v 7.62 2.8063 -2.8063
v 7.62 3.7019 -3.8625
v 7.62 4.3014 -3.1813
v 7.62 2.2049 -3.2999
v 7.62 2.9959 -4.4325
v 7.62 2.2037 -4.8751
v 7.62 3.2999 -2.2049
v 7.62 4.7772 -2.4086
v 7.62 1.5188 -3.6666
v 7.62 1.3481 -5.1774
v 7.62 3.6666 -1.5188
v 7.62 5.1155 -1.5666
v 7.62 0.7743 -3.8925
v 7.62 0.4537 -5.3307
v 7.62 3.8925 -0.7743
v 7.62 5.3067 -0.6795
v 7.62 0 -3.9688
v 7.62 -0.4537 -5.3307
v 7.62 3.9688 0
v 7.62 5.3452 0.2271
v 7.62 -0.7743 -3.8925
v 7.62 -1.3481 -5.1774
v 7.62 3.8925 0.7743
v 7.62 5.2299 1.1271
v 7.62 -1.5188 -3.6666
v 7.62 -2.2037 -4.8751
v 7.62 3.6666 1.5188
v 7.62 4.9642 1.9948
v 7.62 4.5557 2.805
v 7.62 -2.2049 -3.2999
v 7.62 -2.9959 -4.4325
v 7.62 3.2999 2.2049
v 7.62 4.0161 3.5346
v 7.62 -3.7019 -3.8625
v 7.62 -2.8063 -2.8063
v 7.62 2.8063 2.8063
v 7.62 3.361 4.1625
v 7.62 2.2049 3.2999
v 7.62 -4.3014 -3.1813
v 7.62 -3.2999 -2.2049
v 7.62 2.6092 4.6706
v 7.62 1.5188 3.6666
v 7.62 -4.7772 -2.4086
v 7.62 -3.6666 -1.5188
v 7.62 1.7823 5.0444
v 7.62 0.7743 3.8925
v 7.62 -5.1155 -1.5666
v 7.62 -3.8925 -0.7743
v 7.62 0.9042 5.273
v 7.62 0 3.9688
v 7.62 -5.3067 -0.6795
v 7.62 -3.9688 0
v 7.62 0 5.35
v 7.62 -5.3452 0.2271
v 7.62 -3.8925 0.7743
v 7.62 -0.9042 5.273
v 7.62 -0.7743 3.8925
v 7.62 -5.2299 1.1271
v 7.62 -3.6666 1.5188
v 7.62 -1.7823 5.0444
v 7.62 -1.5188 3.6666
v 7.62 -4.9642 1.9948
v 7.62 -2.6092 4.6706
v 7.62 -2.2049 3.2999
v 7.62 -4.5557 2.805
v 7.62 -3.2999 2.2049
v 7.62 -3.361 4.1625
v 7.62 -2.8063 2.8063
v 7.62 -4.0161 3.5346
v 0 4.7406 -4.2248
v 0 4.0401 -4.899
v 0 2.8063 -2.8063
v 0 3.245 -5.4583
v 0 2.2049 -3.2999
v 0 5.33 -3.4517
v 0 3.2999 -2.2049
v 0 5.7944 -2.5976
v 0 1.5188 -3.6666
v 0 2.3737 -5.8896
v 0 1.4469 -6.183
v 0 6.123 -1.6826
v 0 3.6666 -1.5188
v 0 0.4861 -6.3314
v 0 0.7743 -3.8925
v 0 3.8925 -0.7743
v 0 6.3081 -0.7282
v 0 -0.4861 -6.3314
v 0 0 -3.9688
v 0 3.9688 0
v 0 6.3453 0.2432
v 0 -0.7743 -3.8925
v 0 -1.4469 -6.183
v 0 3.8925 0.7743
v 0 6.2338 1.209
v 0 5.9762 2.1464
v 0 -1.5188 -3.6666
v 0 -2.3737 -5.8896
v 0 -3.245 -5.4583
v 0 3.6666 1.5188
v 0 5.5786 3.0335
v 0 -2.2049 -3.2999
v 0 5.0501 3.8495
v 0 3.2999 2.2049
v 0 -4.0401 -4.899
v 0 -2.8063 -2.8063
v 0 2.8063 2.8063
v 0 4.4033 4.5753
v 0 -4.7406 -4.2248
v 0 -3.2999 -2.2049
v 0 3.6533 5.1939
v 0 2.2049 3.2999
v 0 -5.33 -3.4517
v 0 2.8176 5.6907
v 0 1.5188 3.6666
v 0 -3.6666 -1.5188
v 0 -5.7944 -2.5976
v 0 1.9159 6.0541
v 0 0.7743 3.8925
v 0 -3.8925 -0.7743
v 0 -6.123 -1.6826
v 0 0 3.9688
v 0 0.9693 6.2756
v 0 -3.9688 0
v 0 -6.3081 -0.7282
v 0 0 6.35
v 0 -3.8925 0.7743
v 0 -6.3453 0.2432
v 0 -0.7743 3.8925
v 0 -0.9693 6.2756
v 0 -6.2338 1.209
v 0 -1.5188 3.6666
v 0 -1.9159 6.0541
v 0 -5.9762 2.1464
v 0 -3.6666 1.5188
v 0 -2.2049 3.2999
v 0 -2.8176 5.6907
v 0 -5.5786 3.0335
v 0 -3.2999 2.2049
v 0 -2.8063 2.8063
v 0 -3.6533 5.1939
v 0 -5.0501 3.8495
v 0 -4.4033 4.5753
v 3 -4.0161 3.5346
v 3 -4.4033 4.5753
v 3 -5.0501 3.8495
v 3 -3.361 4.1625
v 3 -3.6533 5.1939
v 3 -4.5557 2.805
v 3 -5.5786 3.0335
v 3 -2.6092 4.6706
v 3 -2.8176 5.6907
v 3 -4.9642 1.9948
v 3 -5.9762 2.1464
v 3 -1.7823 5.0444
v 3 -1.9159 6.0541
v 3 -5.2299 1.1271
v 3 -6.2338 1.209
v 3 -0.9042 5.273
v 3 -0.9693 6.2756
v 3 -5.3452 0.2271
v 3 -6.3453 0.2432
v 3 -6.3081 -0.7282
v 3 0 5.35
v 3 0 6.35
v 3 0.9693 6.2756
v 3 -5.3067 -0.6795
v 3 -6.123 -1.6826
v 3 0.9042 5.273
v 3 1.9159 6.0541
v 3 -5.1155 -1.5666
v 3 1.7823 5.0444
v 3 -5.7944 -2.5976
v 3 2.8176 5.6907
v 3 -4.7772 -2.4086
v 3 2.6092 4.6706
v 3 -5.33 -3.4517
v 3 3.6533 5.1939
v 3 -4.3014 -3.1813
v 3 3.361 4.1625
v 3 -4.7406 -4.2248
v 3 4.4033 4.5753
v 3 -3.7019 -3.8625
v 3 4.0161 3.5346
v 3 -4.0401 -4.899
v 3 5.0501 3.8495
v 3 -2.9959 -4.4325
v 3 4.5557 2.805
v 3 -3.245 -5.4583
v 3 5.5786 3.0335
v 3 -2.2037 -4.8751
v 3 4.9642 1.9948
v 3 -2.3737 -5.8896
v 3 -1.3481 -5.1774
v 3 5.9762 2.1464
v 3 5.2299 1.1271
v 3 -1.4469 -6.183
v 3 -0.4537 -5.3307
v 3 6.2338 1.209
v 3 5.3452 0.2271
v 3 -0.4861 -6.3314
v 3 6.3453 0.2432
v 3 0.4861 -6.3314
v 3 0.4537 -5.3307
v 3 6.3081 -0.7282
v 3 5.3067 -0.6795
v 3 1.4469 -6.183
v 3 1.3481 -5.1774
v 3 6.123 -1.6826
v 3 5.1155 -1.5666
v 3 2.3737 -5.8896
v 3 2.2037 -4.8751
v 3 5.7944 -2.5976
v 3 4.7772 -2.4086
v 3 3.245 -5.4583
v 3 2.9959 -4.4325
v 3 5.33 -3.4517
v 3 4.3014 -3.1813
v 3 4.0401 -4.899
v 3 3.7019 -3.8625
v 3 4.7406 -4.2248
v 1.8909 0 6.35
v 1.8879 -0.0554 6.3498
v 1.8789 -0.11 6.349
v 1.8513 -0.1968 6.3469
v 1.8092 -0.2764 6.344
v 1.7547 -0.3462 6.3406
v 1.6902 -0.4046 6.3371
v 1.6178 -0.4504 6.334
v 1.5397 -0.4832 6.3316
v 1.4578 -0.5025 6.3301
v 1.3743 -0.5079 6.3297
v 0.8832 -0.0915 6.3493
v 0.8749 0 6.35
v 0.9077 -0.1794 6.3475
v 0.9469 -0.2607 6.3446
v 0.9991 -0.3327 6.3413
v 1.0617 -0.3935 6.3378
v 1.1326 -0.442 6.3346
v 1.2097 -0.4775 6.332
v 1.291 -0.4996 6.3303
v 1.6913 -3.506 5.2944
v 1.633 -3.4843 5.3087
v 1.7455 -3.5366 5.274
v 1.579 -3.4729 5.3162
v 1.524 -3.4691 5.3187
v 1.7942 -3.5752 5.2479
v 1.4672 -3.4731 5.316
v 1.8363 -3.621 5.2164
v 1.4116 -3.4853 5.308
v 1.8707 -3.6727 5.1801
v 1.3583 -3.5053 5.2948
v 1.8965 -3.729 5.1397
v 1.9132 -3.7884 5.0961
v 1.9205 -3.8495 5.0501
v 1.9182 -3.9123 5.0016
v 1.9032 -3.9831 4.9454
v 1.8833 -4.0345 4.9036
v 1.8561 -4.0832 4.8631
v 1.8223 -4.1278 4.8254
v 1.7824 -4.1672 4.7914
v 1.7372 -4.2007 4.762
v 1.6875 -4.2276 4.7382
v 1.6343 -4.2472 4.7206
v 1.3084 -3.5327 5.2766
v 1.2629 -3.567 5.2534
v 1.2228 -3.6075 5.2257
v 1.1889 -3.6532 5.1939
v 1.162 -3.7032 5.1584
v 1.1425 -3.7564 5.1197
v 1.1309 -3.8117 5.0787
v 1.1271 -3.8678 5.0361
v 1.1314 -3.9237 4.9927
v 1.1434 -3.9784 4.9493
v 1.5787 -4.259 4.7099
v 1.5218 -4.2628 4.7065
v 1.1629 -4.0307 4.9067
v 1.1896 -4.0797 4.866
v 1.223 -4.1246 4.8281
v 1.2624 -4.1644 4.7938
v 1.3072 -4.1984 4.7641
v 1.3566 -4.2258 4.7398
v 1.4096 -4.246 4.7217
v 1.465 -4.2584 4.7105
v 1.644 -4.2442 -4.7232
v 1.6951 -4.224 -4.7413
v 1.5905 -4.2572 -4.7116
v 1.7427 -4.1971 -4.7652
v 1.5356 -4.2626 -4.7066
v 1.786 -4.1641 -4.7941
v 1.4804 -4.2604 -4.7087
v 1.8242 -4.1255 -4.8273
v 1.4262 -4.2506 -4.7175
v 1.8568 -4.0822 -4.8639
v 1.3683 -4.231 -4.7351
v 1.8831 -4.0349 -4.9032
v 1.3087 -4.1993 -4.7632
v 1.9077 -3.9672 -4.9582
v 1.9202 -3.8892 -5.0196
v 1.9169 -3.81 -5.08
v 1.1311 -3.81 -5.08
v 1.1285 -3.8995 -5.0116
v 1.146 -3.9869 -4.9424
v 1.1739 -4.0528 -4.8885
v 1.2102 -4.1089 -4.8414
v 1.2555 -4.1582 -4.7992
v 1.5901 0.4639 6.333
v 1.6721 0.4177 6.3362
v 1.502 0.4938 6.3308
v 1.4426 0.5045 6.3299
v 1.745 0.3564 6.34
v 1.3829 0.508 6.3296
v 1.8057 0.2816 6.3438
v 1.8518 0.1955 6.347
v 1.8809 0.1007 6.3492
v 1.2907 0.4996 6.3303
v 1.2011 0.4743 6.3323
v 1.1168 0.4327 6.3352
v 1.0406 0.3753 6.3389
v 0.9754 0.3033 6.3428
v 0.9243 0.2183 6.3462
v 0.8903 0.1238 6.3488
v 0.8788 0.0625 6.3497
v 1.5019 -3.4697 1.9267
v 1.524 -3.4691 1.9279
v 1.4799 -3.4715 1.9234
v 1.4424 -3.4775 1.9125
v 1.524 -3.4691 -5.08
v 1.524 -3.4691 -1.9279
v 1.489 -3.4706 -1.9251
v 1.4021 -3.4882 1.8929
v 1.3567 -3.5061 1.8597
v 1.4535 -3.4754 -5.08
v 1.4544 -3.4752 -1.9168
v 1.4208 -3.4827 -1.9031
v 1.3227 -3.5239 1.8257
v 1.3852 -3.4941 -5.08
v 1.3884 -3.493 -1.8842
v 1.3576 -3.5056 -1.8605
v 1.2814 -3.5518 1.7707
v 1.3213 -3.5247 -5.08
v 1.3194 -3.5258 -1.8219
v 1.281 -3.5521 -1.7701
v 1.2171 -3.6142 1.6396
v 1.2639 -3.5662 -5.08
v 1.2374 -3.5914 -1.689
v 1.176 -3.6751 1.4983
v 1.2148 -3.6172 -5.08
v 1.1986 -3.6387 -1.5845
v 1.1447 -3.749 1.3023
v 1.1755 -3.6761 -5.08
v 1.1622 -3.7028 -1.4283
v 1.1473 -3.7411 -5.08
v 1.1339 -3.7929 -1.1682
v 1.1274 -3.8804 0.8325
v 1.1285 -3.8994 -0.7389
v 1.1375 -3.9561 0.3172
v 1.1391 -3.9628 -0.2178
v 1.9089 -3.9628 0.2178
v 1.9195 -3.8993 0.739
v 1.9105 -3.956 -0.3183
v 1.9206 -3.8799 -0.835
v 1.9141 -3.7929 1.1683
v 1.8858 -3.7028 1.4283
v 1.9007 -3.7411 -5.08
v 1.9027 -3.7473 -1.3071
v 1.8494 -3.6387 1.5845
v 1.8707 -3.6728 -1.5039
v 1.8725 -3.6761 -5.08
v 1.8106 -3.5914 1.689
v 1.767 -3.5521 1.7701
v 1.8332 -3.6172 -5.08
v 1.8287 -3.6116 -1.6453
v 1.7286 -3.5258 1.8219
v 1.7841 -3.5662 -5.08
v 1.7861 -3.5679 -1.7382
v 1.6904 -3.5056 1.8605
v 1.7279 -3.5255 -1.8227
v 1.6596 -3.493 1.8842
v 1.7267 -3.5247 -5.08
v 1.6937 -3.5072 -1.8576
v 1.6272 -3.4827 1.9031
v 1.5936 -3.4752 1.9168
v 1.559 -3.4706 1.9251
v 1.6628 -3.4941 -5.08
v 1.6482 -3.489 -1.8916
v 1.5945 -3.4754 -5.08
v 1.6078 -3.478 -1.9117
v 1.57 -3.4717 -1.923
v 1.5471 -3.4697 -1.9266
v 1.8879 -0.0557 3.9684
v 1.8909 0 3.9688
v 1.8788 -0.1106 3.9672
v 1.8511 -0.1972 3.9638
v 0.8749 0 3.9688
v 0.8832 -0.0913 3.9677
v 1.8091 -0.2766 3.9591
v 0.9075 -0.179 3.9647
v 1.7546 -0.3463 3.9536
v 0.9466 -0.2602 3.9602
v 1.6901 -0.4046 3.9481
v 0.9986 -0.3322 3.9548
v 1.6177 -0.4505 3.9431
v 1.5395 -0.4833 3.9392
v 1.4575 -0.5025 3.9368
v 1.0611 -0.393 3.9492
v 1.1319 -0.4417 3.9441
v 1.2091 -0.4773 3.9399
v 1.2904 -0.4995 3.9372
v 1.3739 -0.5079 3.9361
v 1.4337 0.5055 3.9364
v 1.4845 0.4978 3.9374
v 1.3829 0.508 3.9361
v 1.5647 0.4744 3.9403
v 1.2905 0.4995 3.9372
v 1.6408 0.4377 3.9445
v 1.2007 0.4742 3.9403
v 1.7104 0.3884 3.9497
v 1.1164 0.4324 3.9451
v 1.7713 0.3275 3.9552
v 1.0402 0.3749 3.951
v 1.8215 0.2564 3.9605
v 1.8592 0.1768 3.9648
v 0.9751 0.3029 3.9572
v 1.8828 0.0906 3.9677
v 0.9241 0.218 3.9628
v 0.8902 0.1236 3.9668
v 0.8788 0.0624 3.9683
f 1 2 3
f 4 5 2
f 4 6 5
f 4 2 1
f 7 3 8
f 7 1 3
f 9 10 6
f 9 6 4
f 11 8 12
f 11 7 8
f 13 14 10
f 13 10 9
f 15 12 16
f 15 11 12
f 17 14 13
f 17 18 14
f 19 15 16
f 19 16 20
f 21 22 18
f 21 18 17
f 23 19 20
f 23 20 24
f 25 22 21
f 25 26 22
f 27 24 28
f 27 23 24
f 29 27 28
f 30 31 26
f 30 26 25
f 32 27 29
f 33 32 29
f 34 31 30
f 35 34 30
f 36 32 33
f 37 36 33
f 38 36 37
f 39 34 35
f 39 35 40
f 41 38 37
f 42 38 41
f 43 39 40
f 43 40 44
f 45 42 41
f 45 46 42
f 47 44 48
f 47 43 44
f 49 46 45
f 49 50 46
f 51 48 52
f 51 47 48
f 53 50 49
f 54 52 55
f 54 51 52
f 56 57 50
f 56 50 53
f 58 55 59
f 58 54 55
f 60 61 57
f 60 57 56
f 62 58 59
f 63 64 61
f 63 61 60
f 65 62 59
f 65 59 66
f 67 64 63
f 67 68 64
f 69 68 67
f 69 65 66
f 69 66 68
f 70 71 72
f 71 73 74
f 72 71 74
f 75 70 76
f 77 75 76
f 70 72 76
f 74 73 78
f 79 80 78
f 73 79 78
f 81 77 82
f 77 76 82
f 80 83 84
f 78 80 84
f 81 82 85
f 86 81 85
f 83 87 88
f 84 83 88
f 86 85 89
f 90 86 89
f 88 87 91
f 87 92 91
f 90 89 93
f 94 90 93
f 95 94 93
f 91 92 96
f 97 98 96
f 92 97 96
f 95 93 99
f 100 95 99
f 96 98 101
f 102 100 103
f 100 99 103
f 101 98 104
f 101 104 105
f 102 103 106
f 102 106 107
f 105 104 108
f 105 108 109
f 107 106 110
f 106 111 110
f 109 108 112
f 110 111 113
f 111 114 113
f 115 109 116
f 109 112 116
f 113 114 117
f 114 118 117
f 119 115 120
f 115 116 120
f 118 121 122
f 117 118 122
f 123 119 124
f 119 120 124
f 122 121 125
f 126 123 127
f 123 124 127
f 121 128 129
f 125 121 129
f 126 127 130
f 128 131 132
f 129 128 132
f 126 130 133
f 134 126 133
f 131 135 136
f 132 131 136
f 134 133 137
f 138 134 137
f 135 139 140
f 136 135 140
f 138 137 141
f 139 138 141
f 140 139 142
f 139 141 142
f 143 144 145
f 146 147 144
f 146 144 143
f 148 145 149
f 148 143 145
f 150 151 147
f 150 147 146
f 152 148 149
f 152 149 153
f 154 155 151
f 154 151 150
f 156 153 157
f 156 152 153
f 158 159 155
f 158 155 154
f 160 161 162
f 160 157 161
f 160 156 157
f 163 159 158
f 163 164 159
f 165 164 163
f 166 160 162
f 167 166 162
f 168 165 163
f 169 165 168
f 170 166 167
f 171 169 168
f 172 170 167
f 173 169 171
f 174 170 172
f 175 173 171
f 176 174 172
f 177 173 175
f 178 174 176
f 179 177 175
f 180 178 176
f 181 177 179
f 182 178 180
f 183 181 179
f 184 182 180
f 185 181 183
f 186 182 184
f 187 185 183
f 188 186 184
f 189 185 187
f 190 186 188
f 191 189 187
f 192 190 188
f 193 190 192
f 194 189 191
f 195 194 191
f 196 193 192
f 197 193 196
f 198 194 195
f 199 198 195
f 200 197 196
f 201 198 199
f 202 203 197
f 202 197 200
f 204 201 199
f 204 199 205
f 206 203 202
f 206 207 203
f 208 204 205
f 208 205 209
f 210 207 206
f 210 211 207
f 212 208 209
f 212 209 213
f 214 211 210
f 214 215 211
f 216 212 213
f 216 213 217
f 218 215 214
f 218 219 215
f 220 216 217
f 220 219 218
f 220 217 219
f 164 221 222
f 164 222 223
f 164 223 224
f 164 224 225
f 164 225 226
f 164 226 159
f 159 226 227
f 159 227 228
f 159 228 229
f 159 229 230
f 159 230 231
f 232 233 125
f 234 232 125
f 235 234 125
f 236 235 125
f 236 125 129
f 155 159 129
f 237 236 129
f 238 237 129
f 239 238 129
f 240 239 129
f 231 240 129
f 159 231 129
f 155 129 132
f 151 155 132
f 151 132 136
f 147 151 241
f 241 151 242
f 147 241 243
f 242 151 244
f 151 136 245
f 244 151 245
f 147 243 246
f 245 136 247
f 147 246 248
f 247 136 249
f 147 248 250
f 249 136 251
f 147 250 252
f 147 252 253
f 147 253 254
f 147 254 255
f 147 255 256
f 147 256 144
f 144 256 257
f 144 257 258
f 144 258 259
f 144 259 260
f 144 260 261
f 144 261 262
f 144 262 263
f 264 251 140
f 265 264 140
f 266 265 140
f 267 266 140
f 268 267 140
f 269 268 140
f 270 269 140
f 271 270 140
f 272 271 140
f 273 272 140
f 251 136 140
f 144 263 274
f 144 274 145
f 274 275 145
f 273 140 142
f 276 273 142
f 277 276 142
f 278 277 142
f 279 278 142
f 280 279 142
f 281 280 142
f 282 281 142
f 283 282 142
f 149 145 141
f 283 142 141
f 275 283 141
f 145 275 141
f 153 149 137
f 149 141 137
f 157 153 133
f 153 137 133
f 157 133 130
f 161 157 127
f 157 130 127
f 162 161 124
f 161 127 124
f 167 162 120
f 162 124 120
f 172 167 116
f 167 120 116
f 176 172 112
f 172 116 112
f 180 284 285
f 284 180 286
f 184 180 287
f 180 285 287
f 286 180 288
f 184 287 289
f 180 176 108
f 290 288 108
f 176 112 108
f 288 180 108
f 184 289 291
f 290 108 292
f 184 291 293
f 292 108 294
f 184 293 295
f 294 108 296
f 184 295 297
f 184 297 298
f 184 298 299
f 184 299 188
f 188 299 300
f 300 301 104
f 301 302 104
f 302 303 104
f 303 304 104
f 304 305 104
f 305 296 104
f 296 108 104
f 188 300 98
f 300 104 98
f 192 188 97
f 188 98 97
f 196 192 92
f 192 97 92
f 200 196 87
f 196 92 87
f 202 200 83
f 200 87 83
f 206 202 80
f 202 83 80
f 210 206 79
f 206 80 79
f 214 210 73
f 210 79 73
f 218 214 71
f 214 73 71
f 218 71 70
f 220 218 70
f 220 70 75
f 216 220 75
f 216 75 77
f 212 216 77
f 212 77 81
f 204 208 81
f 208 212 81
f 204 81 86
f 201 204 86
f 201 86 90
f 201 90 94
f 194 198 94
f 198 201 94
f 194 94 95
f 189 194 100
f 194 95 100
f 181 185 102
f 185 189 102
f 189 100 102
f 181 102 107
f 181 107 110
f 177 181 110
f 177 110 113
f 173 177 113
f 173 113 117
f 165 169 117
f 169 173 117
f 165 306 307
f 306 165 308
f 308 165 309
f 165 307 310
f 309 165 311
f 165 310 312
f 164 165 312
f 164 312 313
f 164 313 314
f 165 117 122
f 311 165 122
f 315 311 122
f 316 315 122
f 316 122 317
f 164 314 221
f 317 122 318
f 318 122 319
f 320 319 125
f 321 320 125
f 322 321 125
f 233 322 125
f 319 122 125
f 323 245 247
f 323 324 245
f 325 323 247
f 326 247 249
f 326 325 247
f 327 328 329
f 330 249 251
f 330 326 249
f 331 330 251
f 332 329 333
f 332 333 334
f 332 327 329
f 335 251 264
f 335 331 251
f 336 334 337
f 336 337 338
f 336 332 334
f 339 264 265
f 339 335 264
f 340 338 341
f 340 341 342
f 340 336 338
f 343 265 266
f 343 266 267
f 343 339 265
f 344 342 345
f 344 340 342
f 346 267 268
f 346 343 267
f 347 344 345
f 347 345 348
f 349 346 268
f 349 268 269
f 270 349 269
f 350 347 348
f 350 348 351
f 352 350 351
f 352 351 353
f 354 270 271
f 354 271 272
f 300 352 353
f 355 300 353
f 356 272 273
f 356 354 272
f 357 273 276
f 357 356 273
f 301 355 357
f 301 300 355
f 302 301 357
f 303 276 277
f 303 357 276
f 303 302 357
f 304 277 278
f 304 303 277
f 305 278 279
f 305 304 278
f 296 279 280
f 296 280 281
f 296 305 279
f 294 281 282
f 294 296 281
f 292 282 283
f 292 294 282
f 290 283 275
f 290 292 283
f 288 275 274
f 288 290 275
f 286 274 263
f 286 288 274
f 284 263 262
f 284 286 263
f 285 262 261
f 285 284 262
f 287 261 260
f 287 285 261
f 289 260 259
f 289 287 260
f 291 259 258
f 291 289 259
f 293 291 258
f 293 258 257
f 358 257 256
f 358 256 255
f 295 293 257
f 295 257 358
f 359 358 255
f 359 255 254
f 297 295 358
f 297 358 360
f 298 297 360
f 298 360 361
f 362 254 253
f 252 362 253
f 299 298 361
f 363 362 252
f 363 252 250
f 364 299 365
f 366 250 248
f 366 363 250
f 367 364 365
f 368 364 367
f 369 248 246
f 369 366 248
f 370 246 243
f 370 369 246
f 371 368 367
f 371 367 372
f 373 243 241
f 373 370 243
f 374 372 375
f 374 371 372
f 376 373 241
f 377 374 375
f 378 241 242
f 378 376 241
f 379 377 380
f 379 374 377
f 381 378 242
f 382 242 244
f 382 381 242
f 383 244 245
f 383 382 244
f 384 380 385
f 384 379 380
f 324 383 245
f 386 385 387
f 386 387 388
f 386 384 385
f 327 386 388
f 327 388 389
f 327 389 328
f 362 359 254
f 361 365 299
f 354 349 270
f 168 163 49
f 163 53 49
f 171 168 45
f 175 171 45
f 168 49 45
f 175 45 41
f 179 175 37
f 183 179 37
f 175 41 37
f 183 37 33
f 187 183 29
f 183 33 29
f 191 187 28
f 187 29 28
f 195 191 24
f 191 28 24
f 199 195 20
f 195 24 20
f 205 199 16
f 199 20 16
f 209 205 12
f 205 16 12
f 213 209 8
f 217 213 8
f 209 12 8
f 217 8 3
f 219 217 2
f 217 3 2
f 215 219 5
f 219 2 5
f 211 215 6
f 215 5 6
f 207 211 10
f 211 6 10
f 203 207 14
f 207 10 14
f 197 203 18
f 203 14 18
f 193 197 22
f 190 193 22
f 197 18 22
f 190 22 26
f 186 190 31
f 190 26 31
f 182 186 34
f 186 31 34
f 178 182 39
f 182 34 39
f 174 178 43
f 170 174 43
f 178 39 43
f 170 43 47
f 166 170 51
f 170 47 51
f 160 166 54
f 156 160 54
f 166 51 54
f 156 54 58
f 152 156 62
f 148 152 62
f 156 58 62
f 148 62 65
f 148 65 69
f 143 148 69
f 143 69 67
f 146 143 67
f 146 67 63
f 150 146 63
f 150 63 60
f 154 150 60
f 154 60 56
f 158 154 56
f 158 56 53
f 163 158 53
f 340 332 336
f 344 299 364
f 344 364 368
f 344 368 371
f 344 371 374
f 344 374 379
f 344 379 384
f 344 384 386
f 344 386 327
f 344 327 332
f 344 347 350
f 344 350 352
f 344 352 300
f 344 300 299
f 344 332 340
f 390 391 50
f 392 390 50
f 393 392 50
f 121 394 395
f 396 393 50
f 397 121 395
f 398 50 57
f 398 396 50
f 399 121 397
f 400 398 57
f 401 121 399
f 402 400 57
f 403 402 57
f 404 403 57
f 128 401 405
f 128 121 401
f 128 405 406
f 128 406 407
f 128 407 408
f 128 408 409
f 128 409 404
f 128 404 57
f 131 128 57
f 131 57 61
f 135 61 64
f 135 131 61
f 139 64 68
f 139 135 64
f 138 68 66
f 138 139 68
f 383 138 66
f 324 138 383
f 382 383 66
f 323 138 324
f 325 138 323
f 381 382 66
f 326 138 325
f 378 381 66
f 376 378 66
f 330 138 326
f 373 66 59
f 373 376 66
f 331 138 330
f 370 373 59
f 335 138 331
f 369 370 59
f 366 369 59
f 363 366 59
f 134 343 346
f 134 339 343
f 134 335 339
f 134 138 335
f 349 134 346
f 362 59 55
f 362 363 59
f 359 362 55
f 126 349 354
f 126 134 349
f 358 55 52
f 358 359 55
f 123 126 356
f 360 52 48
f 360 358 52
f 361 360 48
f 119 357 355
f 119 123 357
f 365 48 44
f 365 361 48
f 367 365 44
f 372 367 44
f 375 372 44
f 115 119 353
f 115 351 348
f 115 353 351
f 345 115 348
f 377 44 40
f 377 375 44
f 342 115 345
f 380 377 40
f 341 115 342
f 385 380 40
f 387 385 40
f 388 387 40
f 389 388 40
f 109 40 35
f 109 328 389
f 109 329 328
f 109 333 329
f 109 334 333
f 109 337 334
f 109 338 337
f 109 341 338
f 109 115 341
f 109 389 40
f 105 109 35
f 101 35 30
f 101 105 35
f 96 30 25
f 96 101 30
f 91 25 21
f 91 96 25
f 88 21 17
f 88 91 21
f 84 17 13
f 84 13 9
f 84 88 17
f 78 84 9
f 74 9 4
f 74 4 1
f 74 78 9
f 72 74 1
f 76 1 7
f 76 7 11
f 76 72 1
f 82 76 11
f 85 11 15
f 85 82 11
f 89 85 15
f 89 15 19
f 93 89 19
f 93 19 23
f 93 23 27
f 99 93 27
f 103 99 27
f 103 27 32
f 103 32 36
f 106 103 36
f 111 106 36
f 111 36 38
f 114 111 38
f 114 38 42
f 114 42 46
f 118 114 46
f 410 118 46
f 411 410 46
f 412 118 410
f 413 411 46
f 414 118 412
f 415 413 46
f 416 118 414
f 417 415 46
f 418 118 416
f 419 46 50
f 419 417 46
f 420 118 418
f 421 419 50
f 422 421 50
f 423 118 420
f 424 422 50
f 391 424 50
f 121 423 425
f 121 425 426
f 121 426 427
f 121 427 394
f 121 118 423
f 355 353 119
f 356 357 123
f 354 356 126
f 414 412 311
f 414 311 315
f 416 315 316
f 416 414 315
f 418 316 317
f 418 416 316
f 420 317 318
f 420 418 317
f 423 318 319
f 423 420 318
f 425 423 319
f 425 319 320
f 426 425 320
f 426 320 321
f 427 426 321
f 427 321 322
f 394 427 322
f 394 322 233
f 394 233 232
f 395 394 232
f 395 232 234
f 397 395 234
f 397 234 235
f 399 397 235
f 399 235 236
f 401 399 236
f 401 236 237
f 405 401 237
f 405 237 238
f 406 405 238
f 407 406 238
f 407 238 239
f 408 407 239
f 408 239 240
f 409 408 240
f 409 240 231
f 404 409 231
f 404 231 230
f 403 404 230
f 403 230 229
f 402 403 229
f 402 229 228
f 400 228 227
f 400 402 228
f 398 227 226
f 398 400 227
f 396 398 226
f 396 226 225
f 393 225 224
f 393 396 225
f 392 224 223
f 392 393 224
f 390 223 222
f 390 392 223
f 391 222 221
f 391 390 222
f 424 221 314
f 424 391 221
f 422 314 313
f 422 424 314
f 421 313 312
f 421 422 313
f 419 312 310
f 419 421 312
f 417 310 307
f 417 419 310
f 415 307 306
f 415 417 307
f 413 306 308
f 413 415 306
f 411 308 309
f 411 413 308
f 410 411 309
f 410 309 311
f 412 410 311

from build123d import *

# Parameters (mm, degrees)
SKETCH1_R           = 6.35
SKETCH1_R_2         = 3.96875
BOSS_EXTRUDE1_DEPTH = 7.62
SKETCH2_W           = 4.62
SKETCH2_H           = 1


with BuildPart() as part:
    # Sketch1 → Boss-Extrude1 (new body)
    with BuildSketch(Plane(origin=(0, 0, 0), x_dir=(0, 0, -1), z_dir=(1, 0, 0))):
        with Locations(Location((0, 0, 0), (0, 0, 180))):
            Circle(SKETCH1_R)
        with Locations(Location((0, 0, 0), (0, 0, 180))):
            Circle(SKETCH1_R_2, mode=Mode.SUBTRACT)
    extrude(amount=BOSS_EXTRUDE1_DEPTH)

    # Sketch2 → Cut-Revolve1 (revolve, cut)
    with BuildSketch(Plane.XY, mode=Mode.PRIVATE) as cut_revolve1_sk:
        with Locations((5.31, 5.85)):
            Rectangle(SKETCH2_W, SKETCH2_H)
    revolve(cut_revolve1_sk.sketch.rotate(Axis((7.62, 0, 0), (-1, 0, 0)), 270), axis=Axis((7.62, 0, 0), (-1, 0, 0)), mode=Mode.SUBTRACT)

    # Sketch3 → #60 (0.04) Diameter Hole1 (revolve, cut)
    with BuildSketch(Plane.YZ.offset(1.382942836)):
        Polygon((0, 0), (0, 25.705237194), (0.508, 25.4), (0.508, 0), align=None)
    revolve(axis=Axis((1.382942836, 0, -6.35), (0, 0, 1)), mode=Mode.SUBTRACT)

    # Sketch5 → 1/32 (0.03125) Diameter Hole1 (revolve, cut)
    with BuildSketch(Plane(origin=(1.524, -3.865933193, -5.08), x_dir=(0, 1, 0), z_dir=(1, 0, 0))):
        Polygon((0, 0), (0, 70.342466558), (0.396875, 70.104), (0.396875, 0), align=None)
    revolve(axis=Axis((1.524, -3.865933193, -11.43), (0, 0, 1)), mode=Mode.SUBTRACT)


solid = part.part
